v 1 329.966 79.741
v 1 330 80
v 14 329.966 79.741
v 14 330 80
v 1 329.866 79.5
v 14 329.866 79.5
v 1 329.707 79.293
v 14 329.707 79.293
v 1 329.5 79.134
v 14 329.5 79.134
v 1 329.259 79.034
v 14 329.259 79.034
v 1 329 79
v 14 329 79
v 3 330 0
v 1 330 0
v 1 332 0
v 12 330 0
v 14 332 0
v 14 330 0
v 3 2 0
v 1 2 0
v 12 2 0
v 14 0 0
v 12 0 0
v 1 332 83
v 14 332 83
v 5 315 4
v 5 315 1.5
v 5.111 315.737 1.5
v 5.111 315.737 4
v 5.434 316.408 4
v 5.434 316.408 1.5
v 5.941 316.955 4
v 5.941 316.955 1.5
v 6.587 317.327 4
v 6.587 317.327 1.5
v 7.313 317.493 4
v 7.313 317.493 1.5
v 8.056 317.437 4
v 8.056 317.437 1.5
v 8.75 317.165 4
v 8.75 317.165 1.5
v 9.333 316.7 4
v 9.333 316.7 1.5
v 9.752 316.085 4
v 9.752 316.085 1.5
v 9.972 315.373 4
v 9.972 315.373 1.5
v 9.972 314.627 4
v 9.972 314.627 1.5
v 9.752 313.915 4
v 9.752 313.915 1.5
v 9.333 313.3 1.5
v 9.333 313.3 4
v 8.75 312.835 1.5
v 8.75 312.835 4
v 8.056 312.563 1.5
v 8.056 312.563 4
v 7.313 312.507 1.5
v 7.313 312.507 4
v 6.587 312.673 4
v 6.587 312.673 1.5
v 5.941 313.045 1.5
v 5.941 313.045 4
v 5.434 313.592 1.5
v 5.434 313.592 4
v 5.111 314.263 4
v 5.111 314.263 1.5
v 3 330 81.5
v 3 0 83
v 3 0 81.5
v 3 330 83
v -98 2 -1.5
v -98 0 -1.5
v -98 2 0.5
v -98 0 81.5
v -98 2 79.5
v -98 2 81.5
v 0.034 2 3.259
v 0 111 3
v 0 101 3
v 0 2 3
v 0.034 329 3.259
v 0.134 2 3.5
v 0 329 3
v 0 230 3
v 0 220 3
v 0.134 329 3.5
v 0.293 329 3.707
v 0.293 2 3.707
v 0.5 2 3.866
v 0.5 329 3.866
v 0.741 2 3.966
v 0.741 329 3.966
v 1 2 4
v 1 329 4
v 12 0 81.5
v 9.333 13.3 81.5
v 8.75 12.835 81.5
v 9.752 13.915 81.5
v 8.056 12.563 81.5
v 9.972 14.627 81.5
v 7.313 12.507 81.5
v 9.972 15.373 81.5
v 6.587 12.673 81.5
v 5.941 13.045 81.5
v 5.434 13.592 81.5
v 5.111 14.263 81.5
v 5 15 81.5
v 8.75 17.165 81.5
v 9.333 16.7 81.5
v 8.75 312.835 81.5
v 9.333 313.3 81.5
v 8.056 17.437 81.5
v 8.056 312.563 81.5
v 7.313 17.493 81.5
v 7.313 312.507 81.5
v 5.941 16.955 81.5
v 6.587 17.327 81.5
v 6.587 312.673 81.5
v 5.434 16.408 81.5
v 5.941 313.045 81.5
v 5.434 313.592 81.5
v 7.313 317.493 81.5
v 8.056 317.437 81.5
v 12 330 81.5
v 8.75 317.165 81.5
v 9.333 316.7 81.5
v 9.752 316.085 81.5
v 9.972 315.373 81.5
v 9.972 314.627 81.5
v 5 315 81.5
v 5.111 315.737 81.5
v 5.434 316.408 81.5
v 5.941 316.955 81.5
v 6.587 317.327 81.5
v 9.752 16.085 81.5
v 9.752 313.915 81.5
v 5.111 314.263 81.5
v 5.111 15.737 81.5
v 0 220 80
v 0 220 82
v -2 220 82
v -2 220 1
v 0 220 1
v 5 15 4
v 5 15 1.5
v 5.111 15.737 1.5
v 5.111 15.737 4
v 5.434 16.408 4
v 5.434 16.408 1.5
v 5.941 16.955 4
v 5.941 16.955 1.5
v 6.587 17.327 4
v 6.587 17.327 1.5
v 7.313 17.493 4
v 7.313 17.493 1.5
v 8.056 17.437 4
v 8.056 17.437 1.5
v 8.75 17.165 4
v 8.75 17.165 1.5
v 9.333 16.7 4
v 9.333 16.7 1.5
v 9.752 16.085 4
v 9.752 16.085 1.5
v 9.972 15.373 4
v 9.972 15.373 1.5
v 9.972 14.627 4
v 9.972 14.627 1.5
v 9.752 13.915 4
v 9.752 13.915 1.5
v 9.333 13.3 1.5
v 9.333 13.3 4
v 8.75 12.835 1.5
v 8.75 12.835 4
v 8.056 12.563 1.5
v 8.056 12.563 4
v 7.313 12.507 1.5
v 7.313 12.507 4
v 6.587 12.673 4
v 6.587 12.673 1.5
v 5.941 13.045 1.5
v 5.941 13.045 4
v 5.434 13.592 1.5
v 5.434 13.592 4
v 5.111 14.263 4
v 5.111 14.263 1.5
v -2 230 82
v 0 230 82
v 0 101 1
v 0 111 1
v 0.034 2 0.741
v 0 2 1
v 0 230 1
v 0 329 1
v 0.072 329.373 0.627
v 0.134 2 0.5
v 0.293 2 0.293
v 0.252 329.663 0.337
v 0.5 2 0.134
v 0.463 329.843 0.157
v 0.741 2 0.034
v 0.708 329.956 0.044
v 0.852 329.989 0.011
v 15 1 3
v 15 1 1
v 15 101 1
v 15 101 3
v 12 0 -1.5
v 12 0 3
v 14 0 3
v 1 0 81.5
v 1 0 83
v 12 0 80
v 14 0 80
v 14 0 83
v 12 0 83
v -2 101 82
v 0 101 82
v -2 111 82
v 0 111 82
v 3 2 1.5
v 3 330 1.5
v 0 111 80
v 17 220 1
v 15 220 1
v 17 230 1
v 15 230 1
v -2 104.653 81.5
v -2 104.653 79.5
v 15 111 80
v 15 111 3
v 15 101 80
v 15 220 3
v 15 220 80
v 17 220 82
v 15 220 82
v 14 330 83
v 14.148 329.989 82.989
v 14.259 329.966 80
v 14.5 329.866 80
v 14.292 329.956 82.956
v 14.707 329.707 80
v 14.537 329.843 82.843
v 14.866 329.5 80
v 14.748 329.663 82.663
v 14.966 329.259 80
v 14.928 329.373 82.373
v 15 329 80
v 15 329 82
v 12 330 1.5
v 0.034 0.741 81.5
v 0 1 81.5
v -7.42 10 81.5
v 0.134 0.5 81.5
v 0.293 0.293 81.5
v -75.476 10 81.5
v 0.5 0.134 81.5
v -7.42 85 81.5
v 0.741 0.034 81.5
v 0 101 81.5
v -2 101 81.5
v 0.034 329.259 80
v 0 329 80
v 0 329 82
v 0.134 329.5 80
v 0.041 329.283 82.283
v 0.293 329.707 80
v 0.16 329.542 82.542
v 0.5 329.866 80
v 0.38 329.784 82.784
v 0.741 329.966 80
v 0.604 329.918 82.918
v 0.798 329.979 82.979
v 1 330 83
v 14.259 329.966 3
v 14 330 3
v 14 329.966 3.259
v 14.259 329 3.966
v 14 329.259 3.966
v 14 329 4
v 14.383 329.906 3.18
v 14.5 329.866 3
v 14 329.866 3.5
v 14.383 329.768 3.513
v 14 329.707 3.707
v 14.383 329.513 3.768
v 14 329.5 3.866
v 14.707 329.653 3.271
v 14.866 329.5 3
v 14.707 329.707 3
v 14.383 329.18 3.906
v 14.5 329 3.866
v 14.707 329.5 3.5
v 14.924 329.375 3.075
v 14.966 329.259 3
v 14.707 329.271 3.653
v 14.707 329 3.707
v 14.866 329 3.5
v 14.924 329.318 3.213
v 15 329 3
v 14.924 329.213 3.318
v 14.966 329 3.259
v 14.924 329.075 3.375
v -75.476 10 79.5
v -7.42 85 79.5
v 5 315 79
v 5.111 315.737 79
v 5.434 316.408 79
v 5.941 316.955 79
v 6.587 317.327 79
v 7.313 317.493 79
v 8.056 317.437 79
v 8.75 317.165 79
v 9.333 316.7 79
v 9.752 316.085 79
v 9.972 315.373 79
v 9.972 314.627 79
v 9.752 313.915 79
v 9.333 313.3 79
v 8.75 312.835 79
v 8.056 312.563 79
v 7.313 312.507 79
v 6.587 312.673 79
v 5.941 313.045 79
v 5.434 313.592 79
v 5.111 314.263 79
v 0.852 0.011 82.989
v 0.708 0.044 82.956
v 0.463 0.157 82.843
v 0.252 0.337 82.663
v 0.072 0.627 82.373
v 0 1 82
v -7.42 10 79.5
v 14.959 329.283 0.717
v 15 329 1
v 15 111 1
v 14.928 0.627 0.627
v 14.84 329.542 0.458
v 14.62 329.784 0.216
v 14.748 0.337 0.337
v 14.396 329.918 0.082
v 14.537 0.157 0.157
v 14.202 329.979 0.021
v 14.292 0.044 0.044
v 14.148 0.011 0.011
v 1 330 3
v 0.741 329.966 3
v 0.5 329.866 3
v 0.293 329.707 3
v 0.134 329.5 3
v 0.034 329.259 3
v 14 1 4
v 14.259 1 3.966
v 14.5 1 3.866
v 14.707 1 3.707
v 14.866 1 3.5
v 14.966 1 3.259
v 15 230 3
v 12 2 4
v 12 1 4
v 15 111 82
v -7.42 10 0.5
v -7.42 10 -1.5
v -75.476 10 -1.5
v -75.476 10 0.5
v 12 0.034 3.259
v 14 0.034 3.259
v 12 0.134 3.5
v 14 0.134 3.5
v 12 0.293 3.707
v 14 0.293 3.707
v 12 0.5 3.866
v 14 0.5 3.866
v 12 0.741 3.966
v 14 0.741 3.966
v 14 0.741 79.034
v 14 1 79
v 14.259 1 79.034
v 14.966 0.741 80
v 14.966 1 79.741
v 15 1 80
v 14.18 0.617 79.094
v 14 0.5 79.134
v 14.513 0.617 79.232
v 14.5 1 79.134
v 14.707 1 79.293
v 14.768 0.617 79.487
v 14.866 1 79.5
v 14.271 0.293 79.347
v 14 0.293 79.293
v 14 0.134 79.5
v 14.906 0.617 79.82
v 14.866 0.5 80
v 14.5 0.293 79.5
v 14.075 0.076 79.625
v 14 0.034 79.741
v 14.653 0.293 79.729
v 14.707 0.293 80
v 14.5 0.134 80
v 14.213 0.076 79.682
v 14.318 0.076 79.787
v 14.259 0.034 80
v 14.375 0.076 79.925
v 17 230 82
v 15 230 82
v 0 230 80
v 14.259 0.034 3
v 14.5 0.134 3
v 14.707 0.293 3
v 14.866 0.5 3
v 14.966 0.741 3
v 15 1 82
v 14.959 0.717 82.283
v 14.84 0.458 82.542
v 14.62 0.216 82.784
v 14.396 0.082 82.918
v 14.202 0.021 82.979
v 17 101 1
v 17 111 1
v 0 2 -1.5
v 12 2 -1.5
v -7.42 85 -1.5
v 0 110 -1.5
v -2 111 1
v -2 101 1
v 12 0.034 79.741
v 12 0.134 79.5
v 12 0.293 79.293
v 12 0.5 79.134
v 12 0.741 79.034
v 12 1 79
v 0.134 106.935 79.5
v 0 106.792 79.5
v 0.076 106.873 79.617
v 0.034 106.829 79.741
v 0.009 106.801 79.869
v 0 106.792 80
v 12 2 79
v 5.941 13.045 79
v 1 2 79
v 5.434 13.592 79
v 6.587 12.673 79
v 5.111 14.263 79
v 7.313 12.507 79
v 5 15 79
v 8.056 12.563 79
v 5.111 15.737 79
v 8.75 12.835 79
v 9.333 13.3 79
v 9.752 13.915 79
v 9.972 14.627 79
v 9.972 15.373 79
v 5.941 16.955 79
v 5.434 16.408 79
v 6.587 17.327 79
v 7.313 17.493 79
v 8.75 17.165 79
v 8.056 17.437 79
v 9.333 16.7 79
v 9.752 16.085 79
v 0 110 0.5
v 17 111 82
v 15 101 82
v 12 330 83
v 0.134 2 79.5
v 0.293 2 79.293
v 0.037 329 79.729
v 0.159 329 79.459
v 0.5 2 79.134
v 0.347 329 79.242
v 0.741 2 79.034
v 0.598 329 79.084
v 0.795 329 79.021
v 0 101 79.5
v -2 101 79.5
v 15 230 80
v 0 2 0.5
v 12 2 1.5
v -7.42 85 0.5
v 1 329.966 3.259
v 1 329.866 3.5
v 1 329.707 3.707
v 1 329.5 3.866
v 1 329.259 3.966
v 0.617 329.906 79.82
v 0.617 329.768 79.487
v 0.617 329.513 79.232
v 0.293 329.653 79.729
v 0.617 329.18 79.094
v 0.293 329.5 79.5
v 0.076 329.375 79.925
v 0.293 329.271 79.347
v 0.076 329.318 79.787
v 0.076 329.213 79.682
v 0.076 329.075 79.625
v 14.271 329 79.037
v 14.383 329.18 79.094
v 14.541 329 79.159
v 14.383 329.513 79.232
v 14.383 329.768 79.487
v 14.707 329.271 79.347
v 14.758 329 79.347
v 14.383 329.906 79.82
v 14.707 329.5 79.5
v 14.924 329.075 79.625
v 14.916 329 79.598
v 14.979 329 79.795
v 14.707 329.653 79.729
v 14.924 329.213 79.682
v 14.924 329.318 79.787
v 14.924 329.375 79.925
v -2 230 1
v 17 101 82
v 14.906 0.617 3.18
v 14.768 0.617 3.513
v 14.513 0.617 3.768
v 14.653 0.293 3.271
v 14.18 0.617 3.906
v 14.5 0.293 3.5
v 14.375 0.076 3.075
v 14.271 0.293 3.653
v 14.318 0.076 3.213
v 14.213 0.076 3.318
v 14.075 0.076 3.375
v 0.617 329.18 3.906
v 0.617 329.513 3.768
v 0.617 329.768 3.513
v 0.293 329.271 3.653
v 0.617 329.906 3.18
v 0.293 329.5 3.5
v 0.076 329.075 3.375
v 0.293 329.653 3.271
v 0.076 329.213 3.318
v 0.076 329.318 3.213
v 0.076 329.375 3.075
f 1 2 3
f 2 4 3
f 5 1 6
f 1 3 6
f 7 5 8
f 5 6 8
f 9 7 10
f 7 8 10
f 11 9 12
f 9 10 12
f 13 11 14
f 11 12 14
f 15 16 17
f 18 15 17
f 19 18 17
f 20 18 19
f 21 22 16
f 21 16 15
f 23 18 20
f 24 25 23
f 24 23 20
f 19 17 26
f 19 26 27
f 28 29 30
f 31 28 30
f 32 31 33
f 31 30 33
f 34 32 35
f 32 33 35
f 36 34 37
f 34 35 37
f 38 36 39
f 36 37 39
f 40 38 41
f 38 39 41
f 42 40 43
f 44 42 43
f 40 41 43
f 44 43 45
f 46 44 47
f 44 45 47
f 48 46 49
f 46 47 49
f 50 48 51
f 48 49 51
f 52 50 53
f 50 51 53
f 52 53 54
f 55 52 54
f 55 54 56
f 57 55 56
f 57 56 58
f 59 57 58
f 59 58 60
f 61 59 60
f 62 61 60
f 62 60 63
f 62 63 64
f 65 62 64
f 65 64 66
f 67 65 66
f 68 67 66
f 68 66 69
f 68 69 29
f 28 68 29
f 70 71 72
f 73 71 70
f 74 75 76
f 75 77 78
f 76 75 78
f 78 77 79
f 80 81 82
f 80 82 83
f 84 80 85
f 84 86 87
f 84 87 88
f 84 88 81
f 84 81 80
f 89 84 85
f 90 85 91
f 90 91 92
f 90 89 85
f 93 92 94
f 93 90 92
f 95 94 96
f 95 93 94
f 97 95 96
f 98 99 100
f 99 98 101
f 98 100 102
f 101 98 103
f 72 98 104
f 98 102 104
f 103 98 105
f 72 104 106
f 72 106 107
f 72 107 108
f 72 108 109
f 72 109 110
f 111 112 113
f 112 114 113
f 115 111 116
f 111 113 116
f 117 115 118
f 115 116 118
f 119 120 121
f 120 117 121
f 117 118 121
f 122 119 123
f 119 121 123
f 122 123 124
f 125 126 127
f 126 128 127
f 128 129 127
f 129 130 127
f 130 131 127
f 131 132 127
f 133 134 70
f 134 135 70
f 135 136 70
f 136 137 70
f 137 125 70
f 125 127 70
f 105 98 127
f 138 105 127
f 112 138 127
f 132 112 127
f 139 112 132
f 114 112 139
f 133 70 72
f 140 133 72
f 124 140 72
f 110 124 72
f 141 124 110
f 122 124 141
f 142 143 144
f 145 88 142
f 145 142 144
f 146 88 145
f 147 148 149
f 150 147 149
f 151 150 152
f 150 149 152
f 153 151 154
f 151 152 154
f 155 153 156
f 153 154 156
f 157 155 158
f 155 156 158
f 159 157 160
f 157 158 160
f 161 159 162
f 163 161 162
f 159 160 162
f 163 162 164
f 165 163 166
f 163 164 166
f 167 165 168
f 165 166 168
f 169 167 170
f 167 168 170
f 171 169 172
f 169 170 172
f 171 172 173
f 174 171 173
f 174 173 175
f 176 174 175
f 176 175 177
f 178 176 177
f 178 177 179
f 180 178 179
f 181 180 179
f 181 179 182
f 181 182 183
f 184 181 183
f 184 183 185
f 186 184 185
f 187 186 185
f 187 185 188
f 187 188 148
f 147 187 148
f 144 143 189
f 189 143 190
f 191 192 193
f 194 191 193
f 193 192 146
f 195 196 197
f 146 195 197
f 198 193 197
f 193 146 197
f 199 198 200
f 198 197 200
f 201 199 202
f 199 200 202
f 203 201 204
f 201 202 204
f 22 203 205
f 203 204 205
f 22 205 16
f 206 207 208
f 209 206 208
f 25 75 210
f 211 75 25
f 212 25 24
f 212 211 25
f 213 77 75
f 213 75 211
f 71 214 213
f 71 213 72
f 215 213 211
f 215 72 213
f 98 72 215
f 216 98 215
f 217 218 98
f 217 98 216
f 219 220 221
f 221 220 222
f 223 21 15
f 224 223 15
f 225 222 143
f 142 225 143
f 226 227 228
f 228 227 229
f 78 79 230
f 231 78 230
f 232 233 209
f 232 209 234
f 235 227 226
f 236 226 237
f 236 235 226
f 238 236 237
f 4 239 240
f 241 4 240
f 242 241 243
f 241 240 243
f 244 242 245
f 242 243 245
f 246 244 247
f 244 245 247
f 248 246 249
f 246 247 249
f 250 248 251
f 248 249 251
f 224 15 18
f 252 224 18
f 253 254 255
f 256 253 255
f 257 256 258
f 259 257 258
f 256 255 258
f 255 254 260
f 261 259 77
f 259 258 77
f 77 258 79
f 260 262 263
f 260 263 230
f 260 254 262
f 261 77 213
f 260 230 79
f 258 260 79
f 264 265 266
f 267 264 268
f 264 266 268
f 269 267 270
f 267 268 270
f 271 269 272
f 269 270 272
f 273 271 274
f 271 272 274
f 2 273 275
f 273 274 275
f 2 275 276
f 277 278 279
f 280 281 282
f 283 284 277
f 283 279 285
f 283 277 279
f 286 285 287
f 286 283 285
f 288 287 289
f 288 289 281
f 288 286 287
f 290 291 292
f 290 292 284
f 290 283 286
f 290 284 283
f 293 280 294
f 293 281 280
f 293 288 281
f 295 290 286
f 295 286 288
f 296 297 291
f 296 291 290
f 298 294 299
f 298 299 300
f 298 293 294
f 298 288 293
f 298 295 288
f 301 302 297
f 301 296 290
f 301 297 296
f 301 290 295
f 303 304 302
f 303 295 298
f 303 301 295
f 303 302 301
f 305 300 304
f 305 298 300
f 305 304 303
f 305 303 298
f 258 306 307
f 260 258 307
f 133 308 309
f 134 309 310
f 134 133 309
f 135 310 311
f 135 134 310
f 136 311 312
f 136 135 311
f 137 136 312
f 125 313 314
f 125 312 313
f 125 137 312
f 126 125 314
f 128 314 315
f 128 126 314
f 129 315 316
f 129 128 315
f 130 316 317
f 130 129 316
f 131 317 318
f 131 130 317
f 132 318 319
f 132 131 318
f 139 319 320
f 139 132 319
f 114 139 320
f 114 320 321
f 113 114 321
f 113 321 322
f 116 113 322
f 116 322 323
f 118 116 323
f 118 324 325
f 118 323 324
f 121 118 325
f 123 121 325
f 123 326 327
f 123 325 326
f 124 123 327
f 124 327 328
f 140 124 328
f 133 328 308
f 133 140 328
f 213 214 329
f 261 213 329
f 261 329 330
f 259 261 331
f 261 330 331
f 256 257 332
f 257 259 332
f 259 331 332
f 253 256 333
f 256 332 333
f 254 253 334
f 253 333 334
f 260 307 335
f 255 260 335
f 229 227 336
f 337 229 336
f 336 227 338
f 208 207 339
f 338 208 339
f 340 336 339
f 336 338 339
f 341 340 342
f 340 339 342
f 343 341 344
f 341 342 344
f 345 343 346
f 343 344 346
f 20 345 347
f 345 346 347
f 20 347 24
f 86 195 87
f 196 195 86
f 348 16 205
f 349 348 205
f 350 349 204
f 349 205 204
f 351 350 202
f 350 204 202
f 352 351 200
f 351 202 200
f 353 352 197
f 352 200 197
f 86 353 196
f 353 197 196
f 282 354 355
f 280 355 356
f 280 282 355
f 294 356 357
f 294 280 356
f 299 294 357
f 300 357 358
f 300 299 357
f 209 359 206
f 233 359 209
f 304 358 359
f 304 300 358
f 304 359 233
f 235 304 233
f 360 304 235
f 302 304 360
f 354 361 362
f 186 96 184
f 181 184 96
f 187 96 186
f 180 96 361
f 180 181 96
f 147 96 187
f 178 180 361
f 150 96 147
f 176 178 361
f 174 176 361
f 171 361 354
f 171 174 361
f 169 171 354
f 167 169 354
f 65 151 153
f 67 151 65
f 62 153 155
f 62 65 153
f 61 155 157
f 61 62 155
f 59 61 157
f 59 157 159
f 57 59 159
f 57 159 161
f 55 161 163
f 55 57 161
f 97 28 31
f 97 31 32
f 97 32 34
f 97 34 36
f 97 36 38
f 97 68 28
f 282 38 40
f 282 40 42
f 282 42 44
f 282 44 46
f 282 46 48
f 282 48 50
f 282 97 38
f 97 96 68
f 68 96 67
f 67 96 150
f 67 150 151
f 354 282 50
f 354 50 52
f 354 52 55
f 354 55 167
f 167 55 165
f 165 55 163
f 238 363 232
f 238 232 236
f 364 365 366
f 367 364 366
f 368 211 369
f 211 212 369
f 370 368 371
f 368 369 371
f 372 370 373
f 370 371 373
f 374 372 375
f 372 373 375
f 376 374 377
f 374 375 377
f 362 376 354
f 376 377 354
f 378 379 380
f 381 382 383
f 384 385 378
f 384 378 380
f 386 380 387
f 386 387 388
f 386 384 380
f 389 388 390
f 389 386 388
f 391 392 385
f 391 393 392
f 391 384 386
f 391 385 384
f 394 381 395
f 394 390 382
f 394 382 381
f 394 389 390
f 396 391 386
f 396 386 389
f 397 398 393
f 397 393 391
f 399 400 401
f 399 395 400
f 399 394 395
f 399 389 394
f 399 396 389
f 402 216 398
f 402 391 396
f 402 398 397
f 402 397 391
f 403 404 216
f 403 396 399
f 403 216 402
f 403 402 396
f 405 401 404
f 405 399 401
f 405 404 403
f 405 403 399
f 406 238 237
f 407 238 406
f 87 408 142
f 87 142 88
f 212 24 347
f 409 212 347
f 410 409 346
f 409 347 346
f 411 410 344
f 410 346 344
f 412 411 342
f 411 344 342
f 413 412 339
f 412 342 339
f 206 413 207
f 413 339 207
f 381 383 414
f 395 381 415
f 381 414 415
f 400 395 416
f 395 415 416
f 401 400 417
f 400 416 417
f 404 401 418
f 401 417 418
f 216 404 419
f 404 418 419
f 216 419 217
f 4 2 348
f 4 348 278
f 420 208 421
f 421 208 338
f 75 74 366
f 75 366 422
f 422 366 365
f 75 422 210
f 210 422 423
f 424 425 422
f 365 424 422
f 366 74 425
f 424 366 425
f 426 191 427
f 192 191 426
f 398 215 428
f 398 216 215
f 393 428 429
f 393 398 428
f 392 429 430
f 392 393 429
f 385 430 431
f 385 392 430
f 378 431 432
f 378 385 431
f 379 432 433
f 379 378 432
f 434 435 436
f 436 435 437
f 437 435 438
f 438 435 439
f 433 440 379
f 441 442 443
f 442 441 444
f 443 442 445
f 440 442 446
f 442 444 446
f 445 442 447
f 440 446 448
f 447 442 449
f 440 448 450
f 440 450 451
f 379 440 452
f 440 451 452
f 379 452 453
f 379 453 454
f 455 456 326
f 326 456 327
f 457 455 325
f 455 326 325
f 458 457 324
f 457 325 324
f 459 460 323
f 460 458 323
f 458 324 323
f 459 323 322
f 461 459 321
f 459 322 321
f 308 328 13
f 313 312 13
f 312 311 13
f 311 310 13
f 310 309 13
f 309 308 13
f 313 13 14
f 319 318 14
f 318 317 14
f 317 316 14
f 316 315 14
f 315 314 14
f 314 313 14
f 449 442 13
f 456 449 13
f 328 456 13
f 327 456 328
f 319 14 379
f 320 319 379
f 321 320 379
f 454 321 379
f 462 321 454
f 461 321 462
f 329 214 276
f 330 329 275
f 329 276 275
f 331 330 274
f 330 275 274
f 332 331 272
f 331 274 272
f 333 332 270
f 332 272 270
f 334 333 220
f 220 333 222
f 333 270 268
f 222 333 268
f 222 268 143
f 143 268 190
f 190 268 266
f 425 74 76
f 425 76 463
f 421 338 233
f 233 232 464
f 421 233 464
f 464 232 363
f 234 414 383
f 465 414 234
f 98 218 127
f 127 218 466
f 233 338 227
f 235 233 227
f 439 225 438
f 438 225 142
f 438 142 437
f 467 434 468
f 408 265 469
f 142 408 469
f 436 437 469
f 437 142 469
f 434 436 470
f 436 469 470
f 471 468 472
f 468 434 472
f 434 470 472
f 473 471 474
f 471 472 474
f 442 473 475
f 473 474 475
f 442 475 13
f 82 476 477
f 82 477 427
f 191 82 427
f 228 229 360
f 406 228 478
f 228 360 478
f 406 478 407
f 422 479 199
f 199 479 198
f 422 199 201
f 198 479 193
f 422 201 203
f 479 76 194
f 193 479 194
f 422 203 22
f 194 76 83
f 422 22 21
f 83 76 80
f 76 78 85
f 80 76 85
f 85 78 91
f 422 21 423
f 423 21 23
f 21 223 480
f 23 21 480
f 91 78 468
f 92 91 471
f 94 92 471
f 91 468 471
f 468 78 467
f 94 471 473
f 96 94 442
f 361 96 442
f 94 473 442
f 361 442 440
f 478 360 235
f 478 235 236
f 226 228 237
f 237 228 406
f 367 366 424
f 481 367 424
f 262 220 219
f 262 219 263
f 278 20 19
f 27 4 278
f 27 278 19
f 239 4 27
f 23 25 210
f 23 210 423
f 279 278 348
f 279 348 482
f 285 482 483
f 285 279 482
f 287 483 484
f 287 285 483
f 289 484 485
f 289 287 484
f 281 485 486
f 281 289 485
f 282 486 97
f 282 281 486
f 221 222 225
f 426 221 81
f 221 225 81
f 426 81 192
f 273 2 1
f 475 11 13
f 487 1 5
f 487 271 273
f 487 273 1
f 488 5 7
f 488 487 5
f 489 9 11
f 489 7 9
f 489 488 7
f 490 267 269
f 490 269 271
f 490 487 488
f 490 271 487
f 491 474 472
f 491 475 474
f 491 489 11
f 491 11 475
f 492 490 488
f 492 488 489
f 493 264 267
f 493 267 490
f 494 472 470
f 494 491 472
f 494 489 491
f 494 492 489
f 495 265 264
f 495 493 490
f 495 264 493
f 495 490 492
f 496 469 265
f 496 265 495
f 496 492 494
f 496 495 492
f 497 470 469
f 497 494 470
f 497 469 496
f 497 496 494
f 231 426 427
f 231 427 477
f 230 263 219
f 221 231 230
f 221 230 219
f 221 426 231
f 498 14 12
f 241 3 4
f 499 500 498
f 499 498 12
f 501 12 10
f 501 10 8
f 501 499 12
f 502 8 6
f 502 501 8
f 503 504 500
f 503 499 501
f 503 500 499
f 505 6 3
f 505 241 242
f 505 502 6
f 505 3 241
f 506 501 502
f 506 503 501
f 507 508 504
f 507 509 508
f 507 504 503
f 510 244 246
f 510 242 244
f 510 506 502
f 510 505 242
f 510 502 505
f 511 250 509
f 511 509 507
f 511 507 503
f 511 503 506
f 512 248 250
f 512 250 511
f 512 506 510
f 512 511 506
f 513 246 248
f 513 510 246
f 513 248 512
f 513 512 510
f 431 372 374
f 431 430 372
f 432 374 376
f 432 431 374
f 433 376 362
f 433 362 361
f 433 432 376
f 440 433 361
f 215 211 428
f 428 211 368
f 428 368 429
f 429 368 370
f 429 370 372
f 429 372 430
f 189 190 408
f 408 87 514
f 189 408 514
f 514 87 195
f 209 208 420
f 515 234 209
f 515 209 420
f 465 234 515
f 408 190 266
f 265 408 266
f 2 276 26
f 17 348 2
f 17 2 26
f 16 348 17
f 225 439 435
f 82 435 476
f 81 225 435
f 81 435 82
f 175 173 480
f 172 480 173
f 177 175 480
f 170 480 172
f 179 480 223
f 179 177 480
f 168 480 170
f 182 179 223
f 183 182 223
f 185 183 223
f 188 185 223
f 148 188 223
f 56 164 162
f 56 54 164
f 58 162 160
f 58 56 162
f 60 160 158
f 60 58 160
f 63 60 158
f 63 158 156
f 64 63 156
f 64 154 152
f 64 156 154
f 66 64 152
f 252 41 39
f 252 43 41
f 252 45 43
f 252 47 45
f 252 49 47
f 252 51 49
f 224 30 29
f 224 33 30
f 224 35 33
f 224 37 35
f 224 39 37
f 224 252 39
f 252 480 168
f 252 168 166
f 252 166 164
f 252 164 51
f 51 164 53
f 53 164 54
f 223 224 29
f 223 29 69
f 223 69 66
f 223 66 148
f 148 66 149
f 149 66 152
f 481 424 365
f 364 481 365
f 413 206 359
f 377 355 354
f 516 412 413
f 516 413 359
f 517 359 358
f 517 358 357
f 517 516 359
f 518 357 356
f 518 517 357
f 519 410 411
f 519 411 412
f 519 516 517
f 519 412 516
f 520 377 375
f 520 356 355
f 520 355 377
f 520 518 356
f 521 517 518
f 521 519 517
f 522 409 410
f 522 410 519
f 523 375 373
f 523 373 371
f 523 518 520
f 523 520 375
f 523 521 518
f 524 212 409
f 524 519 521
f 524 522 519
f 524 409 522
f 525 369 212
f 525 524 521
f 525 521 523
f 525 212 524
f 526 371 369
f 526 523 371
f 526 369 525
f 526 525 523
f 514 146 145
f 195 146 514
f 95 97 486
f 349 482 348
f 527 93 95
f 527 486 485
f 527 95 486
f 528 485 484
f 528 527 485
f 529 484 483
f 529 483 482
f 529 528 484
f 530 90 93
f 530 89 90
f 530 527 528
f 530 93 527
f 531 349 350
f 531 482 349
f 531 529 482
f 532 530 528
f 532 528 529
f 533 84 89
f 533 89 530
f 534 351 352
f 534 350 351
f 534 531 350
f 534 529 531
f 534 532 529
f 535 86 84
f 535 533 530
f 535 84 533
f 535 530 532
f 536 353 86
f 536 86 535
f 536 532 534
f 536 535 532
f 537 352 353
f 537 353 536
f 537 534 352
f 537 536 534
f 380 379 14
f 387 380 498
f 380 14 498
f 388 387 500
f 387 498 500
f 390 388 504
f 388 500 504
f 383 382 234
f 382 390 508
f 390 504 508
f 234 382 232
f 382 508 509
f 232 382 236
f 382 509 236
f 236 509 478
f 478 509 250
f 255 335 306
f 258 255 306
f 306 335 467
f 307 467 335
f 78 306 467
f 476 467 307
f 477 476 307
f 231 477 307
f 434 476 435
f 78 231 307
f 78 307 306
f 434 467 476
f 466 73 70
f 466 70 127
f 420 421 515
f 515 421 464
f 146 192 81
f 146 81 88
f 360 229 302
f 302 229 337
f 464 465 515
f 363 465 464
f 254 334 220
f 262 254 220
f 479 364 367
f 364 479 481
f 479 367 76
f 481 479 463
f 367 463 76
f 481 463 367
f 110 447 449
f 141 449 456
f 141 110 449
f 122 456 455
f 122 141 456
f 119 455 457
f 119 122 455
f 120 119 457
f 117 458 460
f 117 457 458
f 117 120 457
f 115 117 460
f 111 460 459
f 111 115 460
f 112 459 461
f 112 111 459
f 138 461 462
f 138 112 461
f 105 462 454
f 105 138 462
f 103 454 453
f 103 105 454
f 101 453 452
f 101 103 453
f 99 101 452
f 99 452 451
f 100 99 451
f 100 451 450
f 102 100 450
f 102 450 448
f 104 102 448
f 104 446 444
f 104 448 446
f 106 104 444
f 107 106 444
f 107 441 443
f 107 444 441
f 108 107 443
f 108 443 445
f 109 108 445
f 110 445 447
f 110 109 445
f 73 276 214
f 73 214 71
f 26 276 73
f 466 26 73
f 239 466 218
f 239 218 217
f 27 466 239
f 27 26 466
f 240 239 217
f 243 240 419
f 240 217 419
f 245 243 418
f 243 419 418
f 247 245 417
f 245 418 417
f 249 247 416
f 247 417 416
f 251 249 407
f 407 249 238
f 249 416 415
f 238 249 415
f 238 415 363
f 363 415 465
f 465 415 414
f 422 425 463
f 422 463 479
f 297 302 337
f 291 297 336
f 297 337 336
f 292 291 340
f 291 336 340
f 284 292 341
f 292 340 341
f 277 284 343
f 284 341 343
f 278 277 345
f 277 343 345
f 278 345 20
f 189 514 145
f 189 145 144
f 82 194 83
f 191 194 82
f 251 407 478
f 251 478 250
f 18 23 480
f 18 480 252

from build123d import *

# Parameters (mm, degrees)
SKETCH1_W            = 15
SKETCH1_H            = 330
SLIDER_BODY_DEPTH    = 4
SKETCH2_W            = 9
SKETCH2_H            = 330
SLIDER_INDENTS_DEPTH = 1.5
FILLET5_R            = 1
FILLET6_R            = 1
FILLET7_R            = 1
SKETCH3_R            = 2.5
CUT_EXTRUDE2_DEPTH   = 4
SKETCH5_W            = 13
SKETCH5_H            = 41.5
BOSS_EXTRUDE2_DEPTH  = 2
SKETCH7_W            = 40.5
SKETCH7_H            = 10
SKETCH7_W_2          = 41.5
BOSS_EXTRUDE3_DEPTH  = 2
SKETCH9_W            = 40.5
SKETCH9_H            = 10
SKETCH9_W_2          = 41.5
BOSS_EXTRUDE4_DEPTH  = 2
FILLET5_OF_MIRROR4_R = 1
FILLET6_OF_MIRROR4_R = 1
FILLET7_OF_MIRROR4_R = 1
SKETCH11_W           = 110
SKETCH11_H           = 2
BOSS_EXTRUDE5_DEPTH  = 83
BOSS_EXTRUDE6_DEPTH  = 2
BOSS_EXTRUDE7_DEPTH  = 2
CUT_EXTRUDE3_DEPTH   = 83


with BuildPart() as part:
    # Sketch1 → slider_body (new body)
    with BuildSketch(Plane.XY):
        with Locations((7.5, 165)):
            Rectangle(SKETCH1_W, SKETCH1_H)
    slider_body = extrude(amount=SLIDER_BODY_DEPTH)

    # Sketch2 → slider_indents (cut)
    with BuildSketch(Plane(origin=(0, 0, 0), x_dir=(-1, 0, 0), z_dir=(0, 0, -1))):
        with Locations((-7.5, 165)):
            Rectangle(SKETCH2_W, SKETCH2_H)
    slider_indents = extrude(amount=-SLIDER_INDENTS_DEPTH, mode=Mode.SUBTRACT)

    # Fillet5
    fillet5_edges = [part.edges().sort_by_distance(p)[0] for p in [
        (7.5, 330, 4),
        (0, 165, 4),
        (7.5, 0, 4),
        (15, 165, 4),
    ]]
    fillet(fillet5_edges, radius=FILLET5_R)

    # Fillet6
    # the kernel refuses this fillet: 1 mm, written as the material it takes off along each edge
    with BuildSketch(Plane(origin=(1, 1, 3), x_dir=(-1, 0, 0), z_dir=(0, -1, 0))) as fillet6_piece_1_section:
        Polygon((0, 0), (FILLET6_R, 0), (FILLET6_R, -FILLET6_R), (0, -FILLET6_R), align=None)
    fillet6_piece_1 = extrude(amount=FILLET6_R, mode=Mode.PRIVATE)
    fillet6_piece_1 = fillet6_piece_1 - Plane(origin=(1, 1, 3), x_dir=(0.7071067811865475, 0, -0.7071067811865475), z_dir=(0, -1, 0)) * Sphere(FILLET6_R, mode=Mode.PRIVATE)
    add(fillet6_piece_1, mode=Mode.SUBTRACT)
    with BuildSketch(Plane(origin=(1, 329, 3), x_dir=(0, 1, 0), z_dir=(-1, 0, 0))) as fillet6_piece_2_section:
        Polygon((0, 0), (FILLET6_R, 0), (FILLET6_R, -FILLET6_R), (0, -FILLET6_R), align=None)
    fillet6_piece_2 = extrude(amount=FILLET6_R, mode=Mode.PRIVATE)
    fillet6_piece_2 = fillet6_piece_2 - Plane(origin=(1, 329, 3), x_dir=(0, -0.7071067811865475, -0.7071067811865475), z_dir=(-1, 0, 0)) * Sphere(FILLET6_R, mode=Mode.PRIVATE)
    add(fillet6_piece_2, mode=Mode.SUBTRACT)
    with BuildSketch(Plane(origin=(0, 0, -2.5), x_dir=(1, 0, 0), z_dir=(0, 0, 1)), Plane(origin=(0, 330, -2.5), x_dir=(0, -1, 0), z_dir=(0, 0, 1))) as fillet6_piece_3:
        with BuildLine():
            CenterArc((FILLET6_R, FILLET6_R), FILLET6_R, 180, 90)
            Line((0, FILLET6_R), (0, 0))
            Line((0, 0), (FILLET6_R, 0))
        make_face()
    extrude(amount=5.5, mode=Mode.SUBTRACT)
    with BuildSketch(Plane(origin=(0, 332.5, 0), x_dir=(0, 0, 1), z_dir=(0, -1, 0))) as fillet6_piece_4:
        with BuildLine():
            CenterArc((FILLET6_R, -FILLET6_R), FILLET6_R, 90, 90)
            Line((0, -FILLET6_R), (0, 0))
            Line((0, 0), (FILLET6_R, 0))
        make_face()
    extrude(amount=335, mode=Mode.SUBTRACT)

    # Fillet7
    # the kernel refuses this fillet: 1 mm, written as the material it takes off along each edge
    with BuildSketch(Plane(origin=(14, 1, 3), x_dir=(1, 0, 0), z_dir=(0, -1, 0))) as fillet7_piece_1_section:
        Polygon((0, 0), (FILLET7_R, 0), (FILLET7_R, FILLET7_R), (0, FILLET7_R), align=None)
    fillet7_piece_1 = extrude(amount=FILLET7_R, mode=Mode.PRIVATE)
    fillet7_piece_1 = fillet7_piece_1 - Plane(origin=(14, 1, 3), x_dir=(-0.7071067811865475, 0, -0.7071067811865475), z_dir=(0, -1, 0)) * Sphere(FILLET7_R, mode=Mode.PRIVATE)
    add(fillet7_piece_1, mode=Mode.SUBTRACT)
    with BuildSketch(Plane(origin=(14, 329, 3), x_dir=(0, 1, 0), z_dir=(1, 0, 0))) as fillet7_piece_2_section:
        Polygon((0, 0), (FILLET7_R, 0), (FILLET7_R, FILLET7_R), (0, FILLET7_R), align=None)
    fillet7_piece_2 = extrude(amount=FILLET7_R, mode=Mode.PRIVATE)
    fillet7_piece_2 = fillet7_piece_2 - Plane(origin=(14, 329, 3), x_dir=(0, -0.7071067811865475, -0.7071067811865475), z_dir=(1, 0, 0)) * Sphere(FILLET7_R, mode=Mode.PRIVATE)
    add(fillet7_piece_2, mode=Mode.SUBTRACT)
    with BuildSketch(Plane(origin=(15, 330, -2.5), x_dir=(0, -1, 0), z_dir=(0, 0, 1)), Plane(origin=(15, 0, -2.5), x_dir=(-1, 0, 0), z_dir=(0, 0, 1))) as fillet7_piece_3:
        with BuildLine():
            CenterArc((FILLET7_R, -FILLET7_R), FILLET7_R, 90, 90)
            Line((0, -FILLET7_R), (0, 0))
            Line((0, 0), (FILLET7_R, 0))
        make_face()
    extrude(amount=5.5, mode=Mode.SUBTRACT)
    with BuildSketch(Plane(origin=(15, -2.5, 0), x_dir=(-1, 0, 0), z_dir=(0, 1, 0))) as fillet7_piece_4:
        with BuildLine():
            CenterArc((FILLET7_R, FILLET7_R), FILLET7_R, 180, 90)
            Line((0, FILLET7_R), (0, 0))
            Line((0, 0), (FILLET7_R, 0))
        make_face()
    extrude(amount=335, mode=Mode.SUBTRACT)

    # Sketch3 → Cut-Extrude2 (cut)
    with BuildSketch(Plane(origin=(0, 0, 1.5), x_dir=(-1, 0, 0), z_dir=(0, 0, -1))):
        with Locations((-7.5, 315)):
            Circle(SKETCH3_R)
        with Locations((-7.5, 15)):
            Circle(SKETCH3_R)
    cut_extrude2 = extrude(amount=-CUT_EXTRUDE2_DEPTH, mode=Mode.SUBTRACT)

    # Sketch5 → Boss-Extrude2 (add)
    with BuildSketch(Plane(origin=(0, 330, 0), x_dir=(1, 0, 0), z_dir=(0, 1, 0))):
        with Locations((7.5, -20.75)):
            Rectangle(SKETCH5_W, SKETCH5_H)
    boss_extrude2 = extrude(amount=BOSS_EXTRUDE2_DEPTH)

    # Sketch7 → Boss-Extrude3 (add)
    with BuildSketch(Plane.ZY):
        with Locations((21.25, 225)):
            Rectangle(SKETCH7_W, SKETCH7_H)
        with Locations((21.75, 106)):
            Rectangle(SKETCH7_W_2, SKETCH7_H)
    boss_extrude3 = extrude(amount=BOSS_EXTRUDE3_DEPTH)

    # Sketch9 → Boss-Extrude4 (add)
    with BuildSketch(Plane(origin=(15, 0, 0), x_dir=(0, 0, -1), z_dir=(1, 0, 0))):
        with Locations((-21.25, 225)):
            Rectangle(SKETCH9_W, SKETCH9_H)
        with Locations((-21.75, 106)):
            Rectangle(SKETCH9_W_2, SKETCH9_H)
    boss_extrude4 = extrude(amount=BOSS_EXTRUDE4_DEPTH)


with BuildPart() as mirror4_1:
    # Mirror4: slider_body across plane
    add(slider_body.mirror(Plane(origin=(1, 332, 41.5), x_dir=(1, 0, 0), z_dir=(0, 0, -1))))

    # Mirror4 2: slider_indents, Cut-Extrude2 across plane
    add(slider_indents.mirror(Plane(origin=(1, 332, 41.5), x_dir=(1, 0, 0), z_dir=(0, 0, -1))), mode=Mode.SUBTRACT)
    add(cut_extrude2.mirror(Plane(origin=(1, 332, 41.5), x_dir=(1, 0, 0), z_dir=(0, 0, -1))), mode=Mode.SUBTRACT)

    # Fillet5 of Mirror4
    fillet5_of_mirror4_edges = [mirror4_1.edges().sort_by_distance(p)[0] for p in [
        (7.5, 330, 79),
        (0, 165, 79),
        (7.5, 0, 79),
        (15, 165, 79),
    ]]
    fillet(fillet5_of_mirror4_edges, radius=FILLET5_OF_MIRROR4_R)

    # Fillet6 of Mirror4
    # the kernel refuses this fillet: 1 mm, written as the material it takes off along each edge
    with BuildSketch(Plane(origin=(1, 1, 80), x_dir=(-1, 0, 0), z_dir=(0, -1, 0))) as fillet6_of_mirror4_piece_1_section:
        Polygon((0, 0), (FILLET6_OF_MIRROR4_R, 0), (FILLET6_OF_MIRROR4_R, FILLET6_OF_MIRROR4_R), (0, FILLET6_OF_MIRROR4_R), align=None)
    fillet6_of_mirror4_piece_1 = extrude(amount=FILLET6_OF_MIRROR4_R, mode=Mode.PRIVATE)
    fillet6_of_mirror4_piece_1 = fillet6_of_mirror4_piece_1 - Plane(origin=(1, 1, 80), x_dir=(0.7071067811865475, 0, 0.7071067811865475), z_dir=(0, -1, 0)) * Sphere(FILLET6_OF_MIRROR4_R, mode=Mode.PRIVATE)
    add(fillet6_of_mirror4_piece_1, mode=Mode.SUBTRACT)
    with BuildSketch(Plane(origin=(1, 329, 80), x_dir=(0, 1, 0), z_dir=(-1, 0, 0))) as fillet6_of_mirror4_piece_2_section:
        Polygon((0, 0), (FILLET6_OF_MIRROR4_R, 0), (FILLET6_OF_MIRROR4_R, FILLET6_OF_MIRROR4_R), (0, FILLET6_OF_MIRROR4_R), align=None)
    fillet6_of_mirror4_piece_2 = extrude(amount=FILLET6_OF_MIRROR4_R, mode=Mode.PRIVATE)
    fillet6_of_mirror4_piece_2 = fillet6_of_mirror4_piece_2 - Plane(origin=(1, 329, 80), x_dir=(0, -0.7071067811865475, 0.7071067811865475), z_dir=(-1, 0, 0)) * Sphere(FILLET6_OF_MIRROR4_R, mode=Mode.PRIVATE)
    add(fillet6_of_mirror4_piece_2, mode=Mode.SUBTRACT)
    with BuildSketch(Plane(origin=(0, 0, 85.5), x_dir=(1, 0, 0), z_dir=(0, 0, -1)), Plane(origin=(0, 330, 85.5), x_dir=(0, -1, 0), z_dir=(0, 0, -1))) as fillet6_of_mirror4_piece_3:
        with BuildLine():
            CenterArc((FILLET6_OF_MIRROR4_R, -FILLET6_OF_MIRROR4_R), FILLET6_OF_MIRROR4_R, 90, 90)
            Line((0, -FILLET6_OF_MIRROR4_R), (0, 0))
            Line((0, 0), (FILLET6_OF_MIRROR4_R, 0))
        make_face()
    extrude(amount=5.5, mode=Mode.SUBTRACT)
    with BuildSketch(Plane(origin=(0, 332.5, 83), x_dir=(0, 0, -1), z_dir=(0, -1, 0))) as fillet6_of_mirror4_piece_4:
        with BuildLine():
            CenterArc((FILLET6_OF_MIRROR4_R, FILLET6_OF_MIRROR4_R), FILLET6_OF_MIRROR4_R, 180, 90)
            Line((0, FILLET6_OF_MIRROR4_R), (0, 0))
            Line((0, 0), (FILLET6_OF_MIRROR4_R, 0))
        make_face()
    extrude(amount=335, mode=Mode.SUBTRACT)

    # Fillet7 of Mirror4
    # the kernel refuses this fillet: 1 mm, written as the material it takes off along each edge
    with BuildSketch(Plane(origin=(14, 1, 80), x_dir=(1, 0, 0), z_dir=(0, -1, 0))) as fillet7_of_mirror4_piece_1_section:
        Polygon((0, 0), (FILLET7_OF_MIRROR4_R, 0), (FILLET7_OF_MIRROR4_R, -FILLET7_OF_MIRROR4_R), (0, -FILLET7_OF_MIRROR4_R), align=None)
    fillet7_of_mirror4_piece_1 = extrude(amount=FILLET7_OF_MIRROR4_R, mode=Mode.PRIVATE)
    fillet7_of_mirror4_piece_1 = fillet7_of_mirror4_piece_1 - Plane(origin=(14, 1, 80), x_dir=(-0.7071067811865475, 0, 0.7071067811865475), z_dir=(0, -1, 0)) * Sphere(FILLET7_OF_MIRROR4_R, mode=Mode.PRIVATE)
    add(fillet7_of_mirror4_piece_1, mode=Mode.SUBTRACT)
    with BuildSketch(Plane(origin=(14, 329, 80), x_dir=(0, 1, 0), z_dir=(1, 0, 0))) as fillet7_of_mirror4_piece_2_section:
        Polygon((0, 0), (FILLET7_OF_MIRROR4_R, 0), (FILLET7_OF_MIRROR4_R, -FILLET7_OF_MIRROR4_R), (0, -FILLET7_OF_MIRROR4_R), align=None)
    fillet7_of_mirror4_piece_2 = extrude(amount=FILLET7_OF_MIRROR4_R, mode=Mode.PRIVATE)
    fillet7_of_mirror4_piece_2 = fillet7_of_mirror4_piece_2 - Plane(origin=(14, 329, 80), x_dir=(0, -0.7071067811865475, 0.7071067811865475), z_dir=(1, 0, 0)) * Sphere(FILLET7_OF_MIRROR4_R, mode=Mode.PRIVATE)
    add(fillet7_of_mirror4_piece_2, mode=Mode.SUBTRACT)
    with BuildSketch(Plane(origin=(15, 330, 85.5), x_dir=(0, -1, 0), z_dir=(0, 0, -1)), Plane(origin=(15, 0, 85.5), x_dir=(-1, 0, 0), z_dir=(0, 0, -1))) as fillet7_of_mirror4_piece_3:
        with BuildLine():
            CenterArc((FILLET7_OF_MIRROR4_R, FILLET7_OF_MIRROR4_R), FILLET7_OF_MIRROR4_R, 180, 90)
            Line((0, FILLET7_OF_MIRROR4_R), (0, 0))
            Line((0, 0), (FILLET7_OF_MIRROR4_R, 0))
        make_face()
    extrude(amount=5.5, mode=Mode.SUBTRACT)
    with BuildSketch(Plane(origin=(15, -2.5, 83), x_dir=(-1, 0, 0), z_dir=(0, 1, 0))) as fillet7_of_mirror4_piece_4:
        with BuildLine():
            CenterArc((FILLET7_OF_MIRROR4_R, -FILLET7_OF_MIRROR4_R), FILLET7_OF_MIRROR4_R, 90, 90)
            Line((0, -FILLET7_OF_MIRROR4_R), (0, 0))
            Line((0, 0), (FILLET7_OF_MIRROR4_R, 0))
        make_face()
    extrude(amount=335, mode=Mode.SUBTRACT)


with BuildPart() as mirror4_3_1:
    # Mirror4 3: Boss-Extrude2, Boss-Extrude3, Boss-Extrude4 across plane
    add(boss_extrude2.mirror(Plane(origin=(1, 332, 41.5), x_dir=(1, 0, 0), z_dir=(0, 0, -1))))
    add(boss_extrude3.mirror(Plane(origin=(1, 332, 41.5), x_dir=(1, 0, 0), z_dir=(0, 0, -1))))
    add(boss_extrude4.mirror(Plane(origin=(1, 332, 41.5), x_dir=(1, 0, 0), z_dir=(0, 0, -1))))


with BuildPart() as part_1:
    add(part.part)

    # Mirror4 united with what the copies touc: union Mirror4_1, Mirror4 3_1
    add(mirror4_1.part)
    add(mirror4_3_1.part)

    # Sketch11 → Boss-Extrude5 (add)
    with BuildSketch(Plane.XY.offset(81.5)):
        with Locations((-43, 1)):
            Rectangle(SKETCH11_W, SKETCH11_H)
    extrude(amount=-BOSS_EXTRUDE5_DEPTH)

    # Sketch13 → Boss-Extrude6 (add)
    with BuildSketch(Plane.XY.offset(81.5)):
        Polygon((-98, 2), (3, 110), (3, 0), (-98, 0), align=None)
    extrude(amount=-BOSS_EXTRUDE6_DEPTH)

    # Sketch14 → Boss-Extrude7 (add)
    with BuildSketch(Plane(origin=(0, 0, -1.5), x_dir=(-1, 0, 0), z_dir=(0, 0, -1))):
        Polygon((98, 0), (98, 2), (0, 110), (0, 0), align=None)
    extrude(amount=-BOSS_EXTRUDE7_DEPTH)

    # Sketch16 → Cut-Extrude3 (cut)
    with BuildSketch(Plane(origin=(0, 0, -1.5), x_dir=(-1, 0, 0), z_dir=(0, 0, -1))):
        Polygon((7.420460665, 85), (7.420460665, 10), (75.476016221, 10), align=None)
    extrude(amount=-CUT_EXTRUDE3_DEPTH, mode=Mode.SUBTRACT)


solid = part_1.part
